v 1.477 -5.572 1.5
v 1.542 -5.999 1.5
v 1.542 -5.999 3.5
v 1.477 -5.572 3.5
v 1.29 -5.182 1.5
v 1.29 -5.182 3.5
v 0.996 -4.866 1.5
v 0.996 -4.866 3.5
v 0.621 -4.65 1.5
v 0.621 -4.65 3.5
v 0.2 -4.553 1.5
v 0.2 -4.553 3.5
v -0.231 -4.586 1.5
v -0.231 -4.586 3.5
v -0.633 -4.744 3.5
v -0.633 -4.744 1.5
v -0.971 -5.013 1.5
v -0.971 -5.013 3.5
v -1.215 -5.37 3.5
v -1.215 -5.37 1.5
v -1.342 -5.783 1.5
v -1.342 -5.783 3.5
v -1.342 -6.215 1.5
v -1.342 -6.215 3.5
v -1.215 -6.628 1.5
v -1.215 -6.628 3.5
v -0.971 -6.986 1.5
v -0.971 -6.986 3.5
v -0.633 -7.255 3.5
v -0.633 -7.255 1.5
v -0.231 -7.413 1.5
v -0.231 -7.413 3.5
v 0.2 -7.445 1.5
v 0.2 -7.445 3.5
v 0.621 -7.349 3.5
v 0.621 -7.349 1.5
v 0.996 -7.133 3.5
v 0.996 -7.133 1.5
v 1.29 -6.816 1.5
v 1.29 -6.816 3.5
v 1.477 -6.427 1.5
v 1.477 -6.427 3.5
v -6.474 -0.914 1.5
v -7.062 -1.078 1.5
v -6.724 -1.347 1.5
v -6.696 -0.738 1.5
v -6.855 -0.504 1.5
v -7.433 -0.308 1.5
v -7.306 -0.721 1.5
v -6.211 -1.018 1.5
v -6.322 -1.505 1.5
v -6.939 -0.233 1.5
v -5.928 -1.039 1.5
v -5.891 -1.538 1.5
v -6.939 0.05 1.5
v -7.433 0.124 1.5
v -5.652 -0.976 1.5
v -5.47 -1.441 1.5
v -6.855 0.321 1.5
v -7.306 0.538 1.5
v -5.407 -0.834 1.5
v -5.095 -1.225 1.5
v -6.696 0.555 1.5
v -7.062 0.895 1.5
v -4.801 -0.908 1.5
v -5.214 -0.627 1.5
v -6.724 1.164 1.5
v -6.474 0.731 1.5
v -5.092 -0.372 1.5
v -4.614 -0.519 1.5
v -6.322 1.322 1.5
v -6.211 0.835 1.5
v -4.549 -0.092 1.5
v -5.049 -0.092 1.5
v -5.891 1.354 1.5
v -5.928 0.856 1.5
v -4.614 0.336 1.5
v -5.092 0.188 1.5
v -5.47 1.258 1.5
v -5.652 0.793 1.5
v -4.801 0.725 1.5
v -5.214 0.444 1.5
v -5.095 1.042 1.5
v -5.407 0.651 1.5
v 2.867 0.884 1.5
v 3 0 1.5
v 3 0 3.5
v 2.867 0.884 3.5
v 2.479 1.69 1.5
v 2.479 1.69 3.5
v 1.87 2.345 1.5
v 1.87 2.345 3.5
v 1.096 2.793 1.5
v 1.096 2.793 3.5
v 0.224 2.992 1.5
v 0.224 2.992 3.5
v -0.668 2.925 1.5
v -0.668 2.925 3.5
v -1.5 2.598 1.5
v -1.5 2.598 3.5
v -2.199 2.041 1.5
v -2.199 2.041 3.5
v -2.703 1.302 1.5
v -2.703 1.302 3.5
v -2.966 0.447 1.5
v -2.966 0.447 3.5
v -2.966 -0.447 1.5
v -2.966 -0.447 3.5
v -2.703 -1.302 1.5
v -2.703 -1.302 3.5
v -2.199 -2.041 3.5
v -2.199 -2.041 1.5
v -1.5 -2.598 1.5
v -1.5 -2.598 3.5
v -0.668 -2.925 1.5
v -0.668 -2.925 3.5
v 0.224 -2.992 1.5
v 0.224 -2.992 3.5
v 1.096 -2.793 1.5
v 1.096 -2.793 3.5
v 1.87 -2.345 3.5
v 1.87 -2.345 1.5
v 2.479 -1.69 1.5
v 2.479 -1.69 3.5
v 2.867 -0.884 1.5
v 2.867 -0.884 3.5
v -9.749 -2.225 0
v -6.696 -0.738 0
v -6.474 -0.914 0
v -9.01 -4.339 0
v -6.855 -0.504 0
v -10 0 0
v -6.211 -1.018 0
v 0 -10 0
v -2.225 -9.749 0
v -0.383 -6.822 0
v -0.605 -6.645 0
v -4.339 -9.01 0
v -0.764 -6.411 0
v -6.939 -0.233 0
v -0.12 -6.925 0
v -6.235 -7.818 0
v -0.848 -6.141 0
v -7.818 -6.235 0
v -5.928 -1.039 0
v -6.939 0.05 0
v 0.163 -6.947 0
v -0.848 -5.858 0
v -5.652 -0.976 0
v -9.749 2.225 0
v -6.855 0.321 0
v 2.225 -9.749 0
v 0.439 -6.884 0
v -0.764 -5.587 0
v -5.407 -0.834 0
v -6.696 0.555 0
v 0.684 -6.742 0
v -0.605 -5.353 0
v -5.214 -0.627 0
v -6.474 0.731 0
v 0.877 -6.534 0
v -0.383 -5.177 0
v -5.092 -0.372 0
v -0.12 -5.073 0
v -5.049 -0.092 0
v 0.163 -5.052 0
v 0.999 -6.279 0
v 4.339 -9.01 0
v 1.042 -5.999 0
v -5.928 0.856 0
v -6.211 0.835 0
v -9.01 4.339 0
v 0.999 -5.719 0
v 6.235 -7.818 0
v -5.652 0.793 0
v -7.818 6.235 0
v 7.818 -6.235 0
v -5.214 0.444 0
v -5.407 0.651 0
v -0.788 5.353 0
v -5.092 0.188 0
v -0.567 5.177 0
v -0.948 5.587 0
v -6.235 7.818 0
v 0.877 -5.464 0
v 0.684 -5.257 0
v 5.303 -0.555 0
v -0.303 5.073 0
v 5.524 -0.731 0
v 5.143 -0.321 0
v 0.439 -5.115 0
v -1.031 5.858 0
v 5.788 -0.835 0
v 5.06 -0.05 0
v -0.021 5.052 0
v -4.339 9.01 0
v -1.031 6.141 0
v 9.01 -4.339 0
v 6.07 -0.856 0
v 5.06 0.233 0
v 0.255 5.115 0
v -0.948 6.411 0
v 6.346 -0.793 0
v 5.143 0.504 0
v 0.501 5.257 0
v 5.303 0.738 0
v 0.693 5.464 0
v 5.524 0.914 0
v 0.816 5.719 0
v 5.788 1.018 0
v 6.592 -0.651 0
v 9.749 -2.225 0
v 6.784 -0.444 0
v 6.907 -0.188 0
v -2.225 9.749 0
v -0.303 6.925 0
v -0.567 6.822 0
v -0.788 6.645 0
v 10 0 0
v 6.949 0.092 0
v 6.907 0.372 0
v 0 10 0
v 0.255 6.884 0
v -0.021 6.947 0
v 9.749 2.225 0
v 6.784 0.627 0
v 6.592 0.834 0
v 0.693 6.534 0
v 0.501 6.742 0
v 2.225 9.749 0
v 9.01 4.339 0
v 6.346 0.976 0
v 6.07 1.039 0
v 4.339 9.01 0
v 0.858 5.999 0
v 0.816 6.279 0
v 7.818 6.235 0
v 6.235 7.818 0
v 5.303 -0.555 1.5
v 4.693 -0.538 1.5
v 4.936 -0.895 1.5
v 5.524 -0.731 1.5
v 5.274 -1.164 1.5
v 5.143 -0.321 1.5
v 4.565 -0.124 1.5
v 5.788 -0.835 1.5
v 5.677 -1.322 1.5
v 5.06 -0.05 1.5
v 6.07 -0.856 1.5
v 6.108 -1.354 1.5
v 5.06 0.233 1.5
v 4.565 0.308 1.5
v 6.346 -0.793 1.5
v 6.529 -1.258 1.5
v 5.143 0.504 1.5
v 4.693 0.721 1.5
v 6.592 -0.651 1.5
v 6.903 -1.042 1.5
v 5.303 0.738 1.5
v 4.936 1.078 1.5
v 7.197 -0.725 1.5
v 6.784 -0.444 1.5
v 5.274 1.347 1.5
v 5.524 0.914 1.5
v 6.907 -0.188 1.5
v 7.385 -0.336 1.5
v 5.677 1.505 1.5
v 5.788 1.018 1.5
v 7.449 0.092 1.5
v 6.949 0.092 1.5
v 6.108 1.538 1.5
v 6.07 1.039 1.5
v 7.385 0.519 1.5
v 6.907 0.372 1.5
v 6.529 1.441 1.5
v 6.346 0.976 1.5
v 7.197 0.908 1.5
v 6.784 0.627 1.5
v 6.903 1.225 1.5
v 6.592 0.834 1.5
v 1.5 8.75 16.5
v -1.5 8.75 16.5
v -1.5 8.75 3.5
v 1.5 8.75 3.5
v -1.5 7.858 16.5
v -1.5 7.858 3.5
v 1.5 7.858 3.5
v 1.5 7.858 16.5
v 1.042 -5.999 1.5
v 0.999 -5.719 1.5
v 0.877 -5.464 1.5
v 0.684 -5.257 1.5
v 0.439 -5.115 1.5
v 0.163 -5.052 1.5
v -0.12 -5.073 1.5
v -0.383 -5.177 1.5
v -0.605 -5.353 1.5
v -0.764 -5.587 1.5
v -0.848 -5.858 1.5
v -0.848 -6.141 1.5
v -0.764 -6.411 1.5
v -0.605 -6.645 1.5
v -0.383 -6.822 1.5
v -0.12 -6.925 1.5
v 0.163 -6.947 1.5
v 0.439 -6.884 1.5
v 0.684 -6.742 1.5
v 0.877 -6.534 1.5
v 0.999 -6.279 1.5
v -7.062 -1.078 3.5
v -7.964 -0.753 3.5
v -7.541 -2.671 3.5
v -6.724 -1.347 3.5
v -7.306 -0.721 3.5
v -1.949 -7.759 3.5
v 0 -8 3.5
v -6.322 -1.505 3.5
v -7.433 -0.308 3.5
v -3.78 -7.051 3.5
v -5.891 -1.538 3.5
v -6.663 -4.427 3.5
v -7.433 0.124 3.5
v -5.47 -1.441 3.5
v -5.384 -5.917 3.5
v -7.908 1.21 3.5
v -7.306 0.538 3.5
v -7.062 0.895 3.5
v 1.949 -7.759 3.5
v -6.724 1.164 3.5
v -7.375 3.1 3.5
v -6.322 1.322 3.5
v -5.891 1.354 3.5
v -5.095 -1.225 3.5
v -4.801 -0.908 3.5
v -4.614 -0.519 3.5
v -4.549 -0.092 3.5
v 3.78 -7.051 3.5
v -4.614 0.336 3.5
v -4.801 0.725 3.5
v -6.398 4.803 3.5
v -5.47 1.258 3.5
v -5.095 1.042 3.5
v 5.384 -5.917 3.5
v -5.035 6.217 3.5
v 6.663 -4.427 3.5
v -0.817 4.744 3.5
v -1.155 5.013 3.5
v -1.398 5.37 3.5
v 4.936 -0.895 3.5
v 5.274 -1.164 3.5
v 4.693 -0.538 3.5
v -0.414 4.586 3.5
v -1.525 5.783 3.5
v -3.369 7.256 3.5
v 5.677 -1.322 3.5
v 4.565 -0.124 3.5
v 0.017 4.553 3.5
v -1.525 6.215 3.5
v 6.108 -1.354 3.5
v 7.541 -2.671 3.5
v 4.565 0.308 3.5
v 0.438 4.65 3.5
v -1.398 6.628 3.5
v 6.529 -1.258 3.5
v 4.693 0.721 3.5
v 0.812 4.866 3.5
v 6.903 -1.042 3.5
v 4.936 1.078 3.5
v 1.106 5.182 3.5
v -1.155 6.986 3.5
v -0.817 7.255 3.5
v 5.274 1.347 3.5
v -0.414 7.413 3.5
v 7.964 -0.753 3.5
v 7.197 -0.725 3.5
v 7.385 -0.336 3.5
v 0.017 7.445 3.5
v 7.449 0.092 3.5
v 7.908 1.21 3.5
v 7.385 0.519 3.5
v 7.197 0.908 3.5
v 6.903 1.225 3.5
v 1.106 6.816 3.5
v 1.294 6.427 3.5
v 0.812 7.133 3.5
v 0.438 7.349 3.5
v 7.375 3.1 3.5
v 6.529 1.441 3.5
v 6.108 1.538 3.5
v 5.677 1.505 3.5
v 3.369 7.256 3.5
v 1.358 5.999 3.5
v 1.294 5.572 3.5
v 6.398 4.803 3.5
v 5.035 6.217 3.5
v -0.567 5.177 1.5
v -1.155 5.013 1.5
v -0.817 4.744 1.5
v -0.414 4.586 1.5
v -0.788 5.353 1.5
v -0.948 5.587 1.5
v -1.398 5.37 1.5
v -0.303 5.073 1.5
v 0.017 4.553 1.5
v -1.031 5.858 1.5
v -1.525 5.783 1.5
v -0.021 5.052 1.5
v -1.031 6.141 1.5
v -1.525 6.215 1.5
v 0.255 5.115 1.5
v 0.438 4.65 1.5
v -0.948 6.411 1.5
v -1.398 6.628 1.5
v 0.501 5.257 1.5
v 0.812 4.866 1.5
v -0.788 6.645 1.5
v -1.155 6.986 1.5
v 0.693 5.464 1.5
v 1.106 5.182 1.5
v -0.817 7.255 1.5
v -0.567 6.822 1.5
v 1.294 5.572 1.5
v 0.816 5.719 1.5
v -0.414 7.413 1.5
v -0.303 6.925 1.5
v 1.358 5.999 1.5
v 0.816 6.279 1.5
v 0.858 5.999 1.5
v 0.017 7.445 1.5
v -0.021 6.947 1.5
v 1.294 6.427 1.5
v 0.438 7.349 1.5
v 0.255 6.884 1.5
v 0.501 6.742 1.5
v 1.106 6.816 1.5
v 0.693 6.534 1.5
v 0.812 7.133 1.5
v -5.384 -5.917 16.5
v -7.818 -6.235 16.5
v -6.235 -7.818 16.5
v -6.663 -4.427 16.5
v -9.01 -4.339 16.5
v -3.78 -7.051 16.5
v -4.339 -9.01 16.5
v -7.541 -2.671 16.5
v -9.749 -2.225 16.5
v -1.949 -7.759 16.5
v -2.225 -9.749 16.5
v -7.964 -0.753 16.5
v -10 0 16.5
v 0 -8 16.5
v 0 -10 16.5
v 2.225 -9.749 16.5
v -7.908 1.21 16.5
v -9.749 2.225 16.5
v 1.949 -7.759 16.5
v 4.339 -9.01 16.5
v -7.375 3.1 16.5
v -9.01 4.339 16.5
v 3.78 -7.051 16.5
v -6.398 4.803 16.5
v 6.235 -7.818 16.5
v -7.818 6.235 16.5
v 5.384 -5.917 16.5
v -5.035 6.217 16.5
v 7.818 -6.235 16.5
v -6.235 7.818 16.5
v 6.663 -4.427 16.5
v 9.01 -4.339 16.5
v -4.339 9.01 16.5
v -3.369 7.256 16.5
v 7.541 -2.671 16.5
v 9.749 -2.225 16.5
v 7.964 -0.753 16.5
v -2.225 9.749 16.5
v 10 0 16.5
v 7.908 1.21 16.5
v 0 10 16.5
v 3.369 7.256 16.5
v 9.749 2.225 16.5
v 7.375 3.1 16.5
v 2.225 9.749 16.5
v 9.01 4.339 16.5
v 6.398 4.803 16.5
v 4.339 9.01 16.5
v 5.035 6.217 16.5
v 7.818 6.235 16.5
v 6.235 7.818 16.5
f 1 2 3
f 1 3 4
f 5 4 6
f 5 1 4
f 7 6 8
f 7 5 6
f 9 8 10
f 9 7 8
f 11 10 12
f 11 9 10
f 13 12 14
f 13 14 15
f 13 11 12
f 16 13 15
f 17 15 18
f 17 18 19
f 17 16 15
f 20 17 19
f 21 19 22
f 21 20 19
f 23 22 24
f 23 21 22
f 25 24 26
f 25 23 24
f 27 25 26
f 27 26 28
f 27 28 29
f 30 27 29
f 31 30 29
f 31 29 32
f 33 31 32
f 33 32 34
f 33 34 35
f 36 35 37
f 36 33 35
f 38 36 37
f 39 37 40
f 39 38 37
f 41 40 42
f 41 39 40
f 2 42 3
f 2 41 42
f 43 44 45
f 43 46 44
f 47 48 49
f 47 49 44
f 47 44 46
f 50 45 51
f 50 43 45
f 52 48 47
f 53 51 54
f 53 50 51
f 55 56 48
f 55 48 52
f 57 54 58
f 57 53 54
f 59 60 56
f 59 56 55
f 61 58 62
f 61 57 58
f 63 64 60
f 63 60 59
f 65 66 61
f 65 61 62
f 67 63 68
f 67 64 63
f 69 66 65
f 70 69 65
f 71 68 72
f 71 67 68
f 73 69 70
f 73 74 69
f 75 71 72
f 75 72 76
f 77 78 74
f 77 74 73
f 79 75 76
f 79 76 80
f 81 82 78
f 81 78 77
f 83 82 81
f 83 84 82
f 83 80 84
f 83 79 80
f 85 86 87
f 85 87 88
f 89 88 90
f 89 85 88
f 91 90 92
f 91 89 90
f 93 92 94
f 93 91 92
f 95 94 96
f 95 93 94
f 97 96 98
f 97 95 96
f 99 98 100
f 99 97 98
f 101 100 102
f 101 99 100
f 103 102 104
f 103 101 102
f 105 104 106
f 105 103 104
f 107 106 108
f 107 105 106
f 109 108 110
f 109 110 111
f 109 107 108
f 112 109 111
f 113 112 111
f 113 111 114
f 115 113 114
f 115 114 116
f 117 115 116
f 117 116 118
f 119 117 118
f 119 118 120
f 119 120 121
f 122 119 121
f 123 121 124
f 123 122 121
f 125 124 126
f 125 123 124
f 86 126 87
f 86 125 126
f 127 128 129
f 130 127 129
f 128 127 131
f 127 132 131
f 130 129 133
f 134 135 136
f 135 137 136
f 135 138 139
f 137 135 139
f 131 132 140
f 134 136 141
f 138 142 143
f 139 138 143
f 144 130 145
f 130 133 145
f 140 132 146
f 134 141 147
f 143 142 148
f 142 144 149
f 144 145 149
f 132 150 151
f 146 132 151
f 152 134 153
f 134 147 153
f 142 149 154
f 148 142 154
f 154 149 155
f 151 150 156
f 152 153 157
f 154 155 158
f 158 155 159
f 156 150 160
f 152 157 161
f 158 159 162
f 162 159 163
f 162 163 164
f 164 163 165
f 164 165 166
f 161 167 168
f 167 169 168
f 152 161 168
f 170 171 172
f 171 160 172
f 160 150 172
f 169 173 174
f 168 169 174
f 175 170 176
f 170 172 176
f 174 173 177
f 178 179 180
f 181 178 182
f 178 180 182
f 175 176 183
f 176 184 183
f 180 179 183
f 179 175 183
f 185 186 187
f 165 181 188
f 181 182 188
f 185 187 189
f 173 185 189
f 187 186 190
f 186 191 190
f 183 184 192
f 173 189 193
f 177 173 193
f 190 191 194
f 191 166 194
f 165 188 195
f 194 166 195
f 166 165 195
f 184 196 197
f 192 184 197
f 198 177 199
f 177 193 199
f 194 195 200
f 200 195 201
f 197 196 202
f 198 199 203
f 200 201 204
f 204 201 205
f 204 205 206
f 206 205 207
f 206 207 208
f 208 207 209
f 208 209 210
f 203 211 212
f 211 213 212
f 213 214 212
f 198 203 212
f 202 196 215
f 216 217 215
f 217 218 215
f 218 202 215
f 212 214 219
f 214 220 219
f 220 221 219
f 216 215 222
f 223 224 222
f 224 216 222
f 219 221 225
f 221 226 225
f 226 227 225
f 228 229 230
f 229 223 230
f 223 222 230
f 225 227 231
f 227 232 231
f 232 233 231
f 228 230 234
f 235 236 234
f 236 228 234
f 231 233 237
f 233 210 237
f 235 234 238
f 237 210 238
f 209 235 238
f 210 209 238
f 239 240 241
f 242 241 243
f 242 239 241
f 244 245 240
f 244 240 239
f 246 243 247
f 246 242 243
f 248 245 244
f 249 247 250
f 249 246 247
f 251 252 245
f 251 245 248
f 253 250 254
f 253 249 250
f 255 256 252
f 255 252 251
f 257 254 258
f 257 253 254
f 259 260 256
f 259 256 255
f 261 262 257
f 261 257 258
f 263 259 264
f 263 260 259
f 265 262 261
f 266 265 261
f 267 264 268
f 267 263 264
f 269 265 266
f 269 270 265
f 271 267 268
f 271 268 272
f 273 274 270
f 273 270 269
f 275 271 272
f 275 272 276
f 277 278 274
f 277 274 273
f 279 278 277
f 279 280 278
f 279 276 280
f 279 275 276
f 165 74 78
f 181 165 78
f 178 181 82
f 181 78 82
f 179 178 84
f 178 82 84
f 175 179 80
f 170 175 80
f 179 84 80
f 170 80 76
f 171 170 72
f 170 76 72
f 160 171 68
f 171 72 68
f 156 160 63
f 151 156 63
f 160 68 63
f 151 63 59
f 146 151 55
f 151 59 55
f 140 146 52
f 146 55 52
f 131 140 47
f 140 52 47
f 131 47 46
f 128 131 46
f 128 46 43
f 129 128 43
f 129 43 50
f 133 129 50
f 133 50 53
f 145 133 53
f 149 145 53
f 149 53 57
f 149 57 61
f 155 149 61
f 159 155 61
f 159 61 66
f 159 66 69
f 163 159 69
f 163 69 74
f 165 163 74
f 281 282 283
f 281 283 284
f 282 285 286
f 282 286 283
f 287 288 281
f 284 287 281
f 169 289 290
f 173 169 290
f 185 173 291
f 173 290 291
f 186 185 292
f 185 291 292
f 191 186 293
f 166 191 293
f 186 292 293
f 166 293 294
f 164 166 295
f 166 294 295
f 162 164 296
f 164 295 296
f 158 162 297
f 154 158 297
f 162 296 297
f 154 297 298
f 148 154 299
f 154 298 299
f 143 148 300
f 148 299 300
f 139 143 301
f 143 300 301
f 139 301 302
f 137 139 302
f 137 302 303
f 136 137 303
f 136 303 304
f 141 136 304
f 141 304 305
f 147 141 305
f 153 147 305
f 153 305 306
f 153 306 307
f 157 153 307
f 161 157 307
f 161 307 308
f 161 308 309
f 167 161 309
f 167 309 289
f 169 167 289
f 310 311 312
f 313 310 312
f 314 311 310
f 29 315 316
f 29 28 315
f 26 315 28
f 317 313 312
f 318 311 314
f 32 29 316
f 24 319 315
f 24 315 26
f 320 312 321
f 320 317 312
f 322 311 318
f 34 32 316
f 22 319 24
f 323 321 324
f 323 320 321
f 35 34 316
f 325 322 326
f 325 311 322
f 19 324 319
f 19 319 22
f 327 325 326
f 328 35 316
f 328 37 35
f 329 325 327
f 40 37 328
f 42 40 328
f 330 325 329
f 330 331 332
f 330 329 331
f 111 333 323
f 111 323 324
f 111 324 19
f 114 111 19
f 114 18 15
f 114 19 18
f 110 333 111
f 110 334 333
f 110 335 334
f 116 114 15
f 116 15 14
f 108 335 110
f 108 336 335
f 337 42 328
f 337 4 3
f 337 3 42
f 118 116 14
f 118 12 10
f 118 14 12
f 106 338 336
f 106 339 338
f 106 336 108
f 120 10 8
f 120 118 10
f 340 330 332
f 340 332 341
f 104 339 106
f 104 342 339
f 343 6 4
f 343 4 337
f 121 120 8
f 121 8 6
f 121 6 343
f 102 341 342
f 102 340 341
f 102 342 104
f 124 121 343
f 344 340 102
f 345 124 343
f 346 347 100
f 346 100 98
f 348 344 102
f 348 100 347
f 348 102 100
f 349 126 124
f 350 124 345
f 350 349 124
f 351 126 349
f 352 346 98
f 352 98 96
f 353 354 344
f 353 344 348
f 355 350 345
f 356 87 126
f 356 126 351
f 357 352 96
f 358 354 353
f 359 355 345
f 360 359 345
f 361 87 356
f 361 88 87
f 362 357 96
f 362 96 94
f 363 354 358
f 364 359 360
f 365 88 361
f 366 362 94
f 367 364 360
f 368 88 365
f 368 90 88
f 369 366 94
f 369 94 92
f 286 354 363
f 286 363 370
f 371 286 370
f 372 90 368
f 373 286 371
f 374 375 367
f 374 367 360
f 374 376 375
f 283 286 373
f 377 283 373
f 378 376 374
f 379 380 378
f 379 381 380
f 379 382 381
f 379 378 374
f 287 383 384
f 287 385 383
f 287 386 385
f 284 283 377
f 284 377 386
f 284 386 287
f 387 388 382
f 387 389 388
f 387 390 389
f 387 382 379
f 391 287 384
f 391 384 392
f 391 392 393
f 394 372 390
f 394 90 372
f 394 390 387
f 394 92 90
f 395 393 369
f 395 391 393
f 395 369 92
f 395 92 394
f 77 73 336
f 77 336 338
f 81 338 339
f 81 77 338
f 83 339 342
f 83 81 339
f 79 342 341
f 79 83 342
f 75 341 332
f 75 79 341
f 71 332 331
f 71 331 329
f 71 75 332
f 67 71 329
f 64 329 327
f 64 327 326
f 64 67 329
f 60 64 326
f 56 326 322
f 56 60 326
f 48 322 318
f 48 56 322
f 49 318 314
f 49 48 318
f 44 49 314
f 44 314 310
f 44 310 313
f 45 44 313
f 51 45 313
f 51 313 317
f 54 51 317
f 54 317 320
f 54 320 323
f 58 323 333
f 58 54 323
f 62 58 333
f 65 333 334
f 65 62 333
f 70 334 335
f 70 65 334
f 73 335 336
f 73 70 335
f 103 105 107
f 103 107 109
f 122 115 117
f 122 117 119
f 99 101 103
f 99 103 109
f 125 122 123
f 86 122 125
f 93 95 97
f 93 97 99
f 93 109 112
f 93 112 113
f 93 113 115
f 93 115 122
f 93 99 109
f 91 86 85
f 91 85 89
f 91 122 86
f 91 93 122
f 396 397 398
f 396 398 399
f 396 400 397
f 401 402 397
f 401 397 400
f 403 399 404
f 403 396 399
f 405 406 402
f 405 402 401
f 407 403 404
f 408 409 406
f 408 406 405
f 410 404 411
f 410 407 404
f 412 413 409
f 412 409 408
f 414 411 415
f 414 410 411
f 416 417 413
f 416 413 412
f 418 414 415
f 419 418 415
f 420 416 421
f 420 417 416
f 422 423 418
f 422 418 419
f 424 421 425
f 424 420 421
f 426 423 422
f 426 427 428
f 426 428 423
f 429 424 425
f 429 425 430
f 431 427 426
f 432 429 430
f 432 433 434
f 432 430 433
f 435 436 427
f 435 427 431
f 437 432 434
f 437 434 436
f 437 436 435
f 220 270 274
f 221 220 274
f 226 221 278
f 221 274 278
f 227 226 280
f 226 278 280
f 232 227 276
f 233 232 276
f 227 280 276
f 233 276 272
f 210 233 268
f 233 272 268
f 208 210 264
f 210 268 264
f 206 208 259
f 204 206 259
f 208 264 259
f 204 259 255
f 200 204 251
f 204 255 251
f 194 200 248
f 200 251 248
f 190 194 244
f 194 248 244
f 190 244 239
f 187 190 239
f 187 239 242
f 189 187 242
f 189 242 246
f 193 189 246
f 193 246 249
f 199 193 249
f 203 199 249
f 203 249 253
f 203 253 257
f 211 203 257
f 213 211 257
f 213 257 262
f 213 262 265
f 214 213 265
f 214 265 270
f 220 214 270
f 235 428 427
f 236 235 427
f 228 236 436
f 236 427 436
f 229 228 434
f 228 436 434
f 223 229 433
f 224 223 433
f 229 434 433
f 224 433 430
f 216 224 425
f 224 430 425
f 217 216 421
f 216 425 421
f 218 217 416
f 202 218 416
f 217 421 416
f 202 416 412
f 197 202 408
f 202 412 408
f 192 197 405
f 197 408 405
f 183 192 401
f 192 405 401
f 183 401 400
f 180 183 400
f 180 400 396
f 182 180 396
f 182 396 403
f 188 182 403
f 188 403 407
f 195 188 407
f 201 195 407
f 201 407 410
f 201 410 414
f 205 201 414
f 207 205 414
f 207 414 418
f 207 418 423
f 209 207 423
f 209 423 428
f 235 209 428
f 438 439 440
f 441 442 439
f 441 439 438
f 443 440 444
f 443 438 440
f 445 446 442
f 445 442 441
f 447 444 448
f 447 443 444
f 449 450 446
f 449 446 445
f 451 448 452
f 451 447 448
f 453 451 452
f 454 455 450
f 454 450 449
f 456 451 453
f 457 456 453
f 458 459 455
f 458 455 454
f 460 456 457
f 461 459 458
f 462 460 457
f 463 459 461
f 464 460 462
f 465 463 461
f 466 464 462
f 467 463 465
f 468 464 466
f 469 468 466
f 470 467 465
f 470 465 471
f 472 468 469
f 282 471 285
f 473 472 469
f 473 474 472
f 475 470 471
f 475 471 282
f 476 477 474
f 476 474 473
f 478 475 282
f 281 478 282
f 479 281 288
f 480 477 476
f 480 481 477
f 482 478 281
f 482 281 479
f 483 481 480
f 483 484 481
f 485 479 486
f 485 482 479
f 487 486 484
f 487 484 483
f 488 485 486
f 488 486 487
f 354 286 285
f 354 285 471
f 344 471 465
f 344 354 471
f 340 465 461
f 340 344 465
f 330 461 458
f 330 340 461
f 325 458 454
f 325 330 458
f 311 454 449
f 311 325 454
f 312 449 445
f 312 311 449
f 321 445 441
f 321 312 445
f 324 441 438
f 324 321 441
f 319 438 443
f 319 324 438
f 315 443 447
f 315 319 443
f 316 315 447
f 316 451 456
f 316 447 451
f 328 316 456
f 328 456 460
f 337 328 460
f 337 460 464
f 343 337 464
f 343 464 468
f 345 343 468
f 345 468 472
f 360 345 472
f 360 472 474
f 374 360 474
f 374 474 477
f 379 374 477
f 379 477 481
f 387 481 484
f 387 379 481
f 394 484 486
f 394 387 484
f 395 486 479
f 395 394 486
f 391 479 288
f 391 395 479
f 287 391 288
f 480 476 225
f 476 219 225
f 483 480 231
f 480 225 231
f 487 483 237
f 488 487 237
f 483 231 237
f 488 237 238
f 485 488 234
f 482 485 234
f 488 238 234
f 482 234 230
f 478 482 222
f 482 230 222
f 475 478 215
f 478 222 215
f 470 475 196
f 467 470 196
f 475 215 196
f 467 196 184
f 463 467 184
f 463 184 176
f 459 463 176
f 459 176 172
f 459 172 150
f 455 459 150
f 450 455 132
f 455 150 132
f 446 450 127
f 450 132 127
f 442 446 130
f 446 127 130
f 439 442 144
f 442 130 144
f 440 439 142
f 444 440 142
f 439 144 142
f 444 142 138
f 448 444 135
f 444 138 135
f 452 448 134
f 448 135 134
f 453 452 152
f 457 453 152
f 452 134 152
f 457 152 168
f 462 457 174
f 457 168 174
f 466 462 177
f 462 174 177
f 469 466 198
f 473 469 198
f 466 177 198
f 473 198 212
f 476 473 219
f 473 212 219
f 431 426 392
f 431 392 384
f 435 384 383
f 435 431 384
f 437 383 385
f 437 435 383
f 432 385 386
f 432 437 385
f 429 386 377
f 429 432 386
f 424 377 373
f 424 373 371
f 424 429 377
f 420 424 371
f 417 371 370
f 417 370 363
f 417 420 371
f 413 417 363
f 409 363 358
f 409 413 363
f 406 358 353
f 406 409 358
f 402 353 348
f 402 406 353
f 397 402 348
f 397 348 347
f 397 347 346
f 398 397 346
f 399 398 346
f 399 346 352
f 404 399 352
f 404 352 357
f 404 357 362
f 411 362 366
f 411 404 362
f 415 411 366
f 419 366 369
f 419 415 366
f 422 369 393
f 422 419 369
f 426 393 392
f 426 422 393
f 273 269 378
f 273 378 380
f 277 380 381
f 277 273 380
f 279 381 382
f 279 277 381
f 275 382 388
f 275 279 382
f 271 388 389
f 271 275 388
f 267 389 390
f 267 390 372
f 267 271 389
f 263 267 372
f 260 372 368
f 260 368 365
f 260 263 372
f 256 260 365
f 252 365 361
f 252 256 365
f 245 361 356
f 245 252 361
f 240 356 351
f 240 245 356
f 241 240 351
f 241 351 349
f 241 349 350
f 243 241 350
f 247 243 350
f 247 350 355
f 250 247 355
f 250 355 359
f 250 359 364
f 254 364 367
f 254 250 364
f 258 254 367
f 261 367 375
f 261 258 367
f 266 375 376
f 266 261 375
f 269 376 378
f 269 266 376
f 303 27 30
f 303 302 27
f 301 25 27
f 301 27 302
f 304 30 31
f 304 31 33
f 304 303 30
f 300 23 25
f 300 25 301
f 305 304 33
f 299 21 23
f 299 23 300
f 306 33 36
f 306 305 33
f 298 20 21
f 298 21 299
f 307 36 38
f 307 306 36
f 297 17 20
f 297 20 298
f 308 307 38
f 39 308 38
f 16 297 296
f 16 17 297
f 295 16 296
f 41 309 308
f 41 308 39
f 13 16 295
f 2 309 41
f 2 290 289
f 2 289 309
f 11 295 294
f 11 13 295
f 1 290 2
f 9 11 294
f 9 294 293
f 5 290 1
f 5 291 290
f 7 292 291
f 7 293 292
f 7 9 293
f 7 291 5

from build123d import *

# Parameters (mm, degrees)
CROQUIS1_R              = 10
SALIENTE_EXTRUIR1_DEPTH = 1.5
CROQUIS2_R              = 10
CROQUIS2_R_2            = 8
SALIENTE_EXTRUIR2_DEPTH = 15
CORTAR_EXTRUIR2_REACH   = 22.616
CROQUIS4_R              = 0.95
CROQUIS5_W              = 3
CROQUIS5_H              = 1.5
CORTAR_EXTRUIR3_DEPTH   = 15
CROQUIS6_R              = 3
CROQUIS6_R_2            = 1.45
SALIENTE_EXTRUIR3_DEPTH = 2


with BuildPart() as part:
    # Croquis1 → Saliente-Extruir1 (new body)
    with BuildSketch(Plane.XY):
        Circle(CROQUIS1_R)
    extrude(amount=SALIENTE_EXTRUIR1_DEPTH)

    # Croquis2 → Saliente-Extruir2 (add)
    with BuildSketch(Plane.XY.offset(1.5)):
        Circle(CROQUIS2_R)
        Circle(CROQUIS2_R_2, mode=Mode.SUBTRACT)
    extrude(amount=SALIENTE_EXTRUIR2_DEPTH)

    # Croquis4 → Cortar-Extruir2 (cut, up to next)
    with BuildSketch(Plane.XY.offset(1.5), mode=Mode.PRIVATE) as cortar_extruir2_sk1:
        with Locations((-5.999300536, -0.09161372)):
            Circle(CROQUIS4_R)
    cortar_extruir2_tool1 = extrude(cortar_extruir2_sk1.sketch, amount=-CORTAR_EXTRUIR2_REACH, mode=Mode.PRIVATE) & part.part
    # Croquis4 → Cortar-Extruir2 (cut, up to next)
    with BuildSketch(Plane.XY.offset(1.5), mode=Mode.PRIVATE) as cortar_extruir2_sk2:
        with Locations((-0.09161372, 5.999300536)):
            Circle(CROQUIS4_R)
    cortar_extruir2_tool2 = extrude(cortar_extruir2_sk2.sketch, amount=-CORTAR_EXTRUIR2_REACH, mode=Mode.PRIVATE) & part.part
    # Croquis4 → Cortar-Extruir2 (cut, up to next)
    with BuildSketch(Plane.XY.offset(1.5), mode=Mode.PRIVATE) as cortar_extruir2_sk3:
        with Locations((5.999300536, 0.09161372)):
            Circle(CROQUIS4_R)
    cortar_extruir2_tool3 = extrude(cortar_extruir2_sk3.sketch, amount=-CORTAR_EXTRUIR2_REACH, mode=Mode.PRIVATE) & part.part
    # Croquis4 → Cortar-Extruir2 (cut, up to next)
    with BuildSketch(Plane.XY.offset(1.5), mode=Mode.PRIVATE) as cortar_extruir2_sk4:
        with Locations((0.09161372, -5.999300536)):
            Circle(CROQUIS4_R)
    cortar_extruir2_tool4 = extrude(cortar_extruir2_sk4.sketch, amount=-CORTAR_EXTRUIR2_REACH, mode=Mode.PRIVATE) & part.part
    add(cortar_extruir2_tool1.solids().sort_by_distance((-5.999301, -0.091614, 1.5))[0], mode=Mode.SUBTRACT)
    add(cortar_extruir2_tool2.solids().sort_by_distance((-0.091614, 5.999301, 1.5))[0], mode=Mode.SUBTRACT)
    add(cortar_extruir2_tool3.solids().sort_by_distance((5.999301, 0.091614, 1.5))[0], mode=Mode.SUBTRACT)
    add(cortar_extruir2_tool4.solids().sort_by_distance((0.091614, -5.999301, 1.5))[0], mode=Mode.SUBTRACT)

    # Croquis5 → Cortar-Extruir3 (cut)
    with BuildSketch(Plane.XY.offset(16.5)):
        with Locations((0, 8)):
            Rectangle(CROQUIS5_W, CROQUIS5_H)
    extrude(amount=-CORTAR_EXTRUIR3_DEPTH, mode=Mode.SUBTRACT)

    # Croquis6 → Saliente-Extruir3 (add)
    with BuildSketch(Plane.XY.offset(1.5)):
        with BuildLine():
            Line((1.5, 7.858116823), (1.5, 8.75))
            Line((1.5, 8.75), (-1.5, 8.75))
            Line((-1.5, 8.75), (-1.5, 7.858116823))
            ThreePointArc((-1.5, 7.858116823), (0, -8), (1.5, 7.858116823))
        make_face()
        Circle(CROQUIS6_R, mode=Mode.SUBTRACT)
        with Locations((-0.09161372, 5.999300536)):
            Circle(CROQUIS6_R_2, mode=Mode.SUBTRACT)
        with Locations((5.999300536, 0.09161372)):
            Circle(CROQUIS6_R_2, mode=Mode.SUBTRACT)
        with Locations((-5.999300536, -0.09161372)):
            Circle(CROQUIS6_R_2, mode=Mode.SUBTRACT)
        with Locations((0.09161372, -5.999300536)):
            Circle(CROQUIS6_R_2, mode=Mode.SUBTRACT)
    extrude(amount=SALIENTE_EXTRUIR3_DEPTH)


solid = part.part
